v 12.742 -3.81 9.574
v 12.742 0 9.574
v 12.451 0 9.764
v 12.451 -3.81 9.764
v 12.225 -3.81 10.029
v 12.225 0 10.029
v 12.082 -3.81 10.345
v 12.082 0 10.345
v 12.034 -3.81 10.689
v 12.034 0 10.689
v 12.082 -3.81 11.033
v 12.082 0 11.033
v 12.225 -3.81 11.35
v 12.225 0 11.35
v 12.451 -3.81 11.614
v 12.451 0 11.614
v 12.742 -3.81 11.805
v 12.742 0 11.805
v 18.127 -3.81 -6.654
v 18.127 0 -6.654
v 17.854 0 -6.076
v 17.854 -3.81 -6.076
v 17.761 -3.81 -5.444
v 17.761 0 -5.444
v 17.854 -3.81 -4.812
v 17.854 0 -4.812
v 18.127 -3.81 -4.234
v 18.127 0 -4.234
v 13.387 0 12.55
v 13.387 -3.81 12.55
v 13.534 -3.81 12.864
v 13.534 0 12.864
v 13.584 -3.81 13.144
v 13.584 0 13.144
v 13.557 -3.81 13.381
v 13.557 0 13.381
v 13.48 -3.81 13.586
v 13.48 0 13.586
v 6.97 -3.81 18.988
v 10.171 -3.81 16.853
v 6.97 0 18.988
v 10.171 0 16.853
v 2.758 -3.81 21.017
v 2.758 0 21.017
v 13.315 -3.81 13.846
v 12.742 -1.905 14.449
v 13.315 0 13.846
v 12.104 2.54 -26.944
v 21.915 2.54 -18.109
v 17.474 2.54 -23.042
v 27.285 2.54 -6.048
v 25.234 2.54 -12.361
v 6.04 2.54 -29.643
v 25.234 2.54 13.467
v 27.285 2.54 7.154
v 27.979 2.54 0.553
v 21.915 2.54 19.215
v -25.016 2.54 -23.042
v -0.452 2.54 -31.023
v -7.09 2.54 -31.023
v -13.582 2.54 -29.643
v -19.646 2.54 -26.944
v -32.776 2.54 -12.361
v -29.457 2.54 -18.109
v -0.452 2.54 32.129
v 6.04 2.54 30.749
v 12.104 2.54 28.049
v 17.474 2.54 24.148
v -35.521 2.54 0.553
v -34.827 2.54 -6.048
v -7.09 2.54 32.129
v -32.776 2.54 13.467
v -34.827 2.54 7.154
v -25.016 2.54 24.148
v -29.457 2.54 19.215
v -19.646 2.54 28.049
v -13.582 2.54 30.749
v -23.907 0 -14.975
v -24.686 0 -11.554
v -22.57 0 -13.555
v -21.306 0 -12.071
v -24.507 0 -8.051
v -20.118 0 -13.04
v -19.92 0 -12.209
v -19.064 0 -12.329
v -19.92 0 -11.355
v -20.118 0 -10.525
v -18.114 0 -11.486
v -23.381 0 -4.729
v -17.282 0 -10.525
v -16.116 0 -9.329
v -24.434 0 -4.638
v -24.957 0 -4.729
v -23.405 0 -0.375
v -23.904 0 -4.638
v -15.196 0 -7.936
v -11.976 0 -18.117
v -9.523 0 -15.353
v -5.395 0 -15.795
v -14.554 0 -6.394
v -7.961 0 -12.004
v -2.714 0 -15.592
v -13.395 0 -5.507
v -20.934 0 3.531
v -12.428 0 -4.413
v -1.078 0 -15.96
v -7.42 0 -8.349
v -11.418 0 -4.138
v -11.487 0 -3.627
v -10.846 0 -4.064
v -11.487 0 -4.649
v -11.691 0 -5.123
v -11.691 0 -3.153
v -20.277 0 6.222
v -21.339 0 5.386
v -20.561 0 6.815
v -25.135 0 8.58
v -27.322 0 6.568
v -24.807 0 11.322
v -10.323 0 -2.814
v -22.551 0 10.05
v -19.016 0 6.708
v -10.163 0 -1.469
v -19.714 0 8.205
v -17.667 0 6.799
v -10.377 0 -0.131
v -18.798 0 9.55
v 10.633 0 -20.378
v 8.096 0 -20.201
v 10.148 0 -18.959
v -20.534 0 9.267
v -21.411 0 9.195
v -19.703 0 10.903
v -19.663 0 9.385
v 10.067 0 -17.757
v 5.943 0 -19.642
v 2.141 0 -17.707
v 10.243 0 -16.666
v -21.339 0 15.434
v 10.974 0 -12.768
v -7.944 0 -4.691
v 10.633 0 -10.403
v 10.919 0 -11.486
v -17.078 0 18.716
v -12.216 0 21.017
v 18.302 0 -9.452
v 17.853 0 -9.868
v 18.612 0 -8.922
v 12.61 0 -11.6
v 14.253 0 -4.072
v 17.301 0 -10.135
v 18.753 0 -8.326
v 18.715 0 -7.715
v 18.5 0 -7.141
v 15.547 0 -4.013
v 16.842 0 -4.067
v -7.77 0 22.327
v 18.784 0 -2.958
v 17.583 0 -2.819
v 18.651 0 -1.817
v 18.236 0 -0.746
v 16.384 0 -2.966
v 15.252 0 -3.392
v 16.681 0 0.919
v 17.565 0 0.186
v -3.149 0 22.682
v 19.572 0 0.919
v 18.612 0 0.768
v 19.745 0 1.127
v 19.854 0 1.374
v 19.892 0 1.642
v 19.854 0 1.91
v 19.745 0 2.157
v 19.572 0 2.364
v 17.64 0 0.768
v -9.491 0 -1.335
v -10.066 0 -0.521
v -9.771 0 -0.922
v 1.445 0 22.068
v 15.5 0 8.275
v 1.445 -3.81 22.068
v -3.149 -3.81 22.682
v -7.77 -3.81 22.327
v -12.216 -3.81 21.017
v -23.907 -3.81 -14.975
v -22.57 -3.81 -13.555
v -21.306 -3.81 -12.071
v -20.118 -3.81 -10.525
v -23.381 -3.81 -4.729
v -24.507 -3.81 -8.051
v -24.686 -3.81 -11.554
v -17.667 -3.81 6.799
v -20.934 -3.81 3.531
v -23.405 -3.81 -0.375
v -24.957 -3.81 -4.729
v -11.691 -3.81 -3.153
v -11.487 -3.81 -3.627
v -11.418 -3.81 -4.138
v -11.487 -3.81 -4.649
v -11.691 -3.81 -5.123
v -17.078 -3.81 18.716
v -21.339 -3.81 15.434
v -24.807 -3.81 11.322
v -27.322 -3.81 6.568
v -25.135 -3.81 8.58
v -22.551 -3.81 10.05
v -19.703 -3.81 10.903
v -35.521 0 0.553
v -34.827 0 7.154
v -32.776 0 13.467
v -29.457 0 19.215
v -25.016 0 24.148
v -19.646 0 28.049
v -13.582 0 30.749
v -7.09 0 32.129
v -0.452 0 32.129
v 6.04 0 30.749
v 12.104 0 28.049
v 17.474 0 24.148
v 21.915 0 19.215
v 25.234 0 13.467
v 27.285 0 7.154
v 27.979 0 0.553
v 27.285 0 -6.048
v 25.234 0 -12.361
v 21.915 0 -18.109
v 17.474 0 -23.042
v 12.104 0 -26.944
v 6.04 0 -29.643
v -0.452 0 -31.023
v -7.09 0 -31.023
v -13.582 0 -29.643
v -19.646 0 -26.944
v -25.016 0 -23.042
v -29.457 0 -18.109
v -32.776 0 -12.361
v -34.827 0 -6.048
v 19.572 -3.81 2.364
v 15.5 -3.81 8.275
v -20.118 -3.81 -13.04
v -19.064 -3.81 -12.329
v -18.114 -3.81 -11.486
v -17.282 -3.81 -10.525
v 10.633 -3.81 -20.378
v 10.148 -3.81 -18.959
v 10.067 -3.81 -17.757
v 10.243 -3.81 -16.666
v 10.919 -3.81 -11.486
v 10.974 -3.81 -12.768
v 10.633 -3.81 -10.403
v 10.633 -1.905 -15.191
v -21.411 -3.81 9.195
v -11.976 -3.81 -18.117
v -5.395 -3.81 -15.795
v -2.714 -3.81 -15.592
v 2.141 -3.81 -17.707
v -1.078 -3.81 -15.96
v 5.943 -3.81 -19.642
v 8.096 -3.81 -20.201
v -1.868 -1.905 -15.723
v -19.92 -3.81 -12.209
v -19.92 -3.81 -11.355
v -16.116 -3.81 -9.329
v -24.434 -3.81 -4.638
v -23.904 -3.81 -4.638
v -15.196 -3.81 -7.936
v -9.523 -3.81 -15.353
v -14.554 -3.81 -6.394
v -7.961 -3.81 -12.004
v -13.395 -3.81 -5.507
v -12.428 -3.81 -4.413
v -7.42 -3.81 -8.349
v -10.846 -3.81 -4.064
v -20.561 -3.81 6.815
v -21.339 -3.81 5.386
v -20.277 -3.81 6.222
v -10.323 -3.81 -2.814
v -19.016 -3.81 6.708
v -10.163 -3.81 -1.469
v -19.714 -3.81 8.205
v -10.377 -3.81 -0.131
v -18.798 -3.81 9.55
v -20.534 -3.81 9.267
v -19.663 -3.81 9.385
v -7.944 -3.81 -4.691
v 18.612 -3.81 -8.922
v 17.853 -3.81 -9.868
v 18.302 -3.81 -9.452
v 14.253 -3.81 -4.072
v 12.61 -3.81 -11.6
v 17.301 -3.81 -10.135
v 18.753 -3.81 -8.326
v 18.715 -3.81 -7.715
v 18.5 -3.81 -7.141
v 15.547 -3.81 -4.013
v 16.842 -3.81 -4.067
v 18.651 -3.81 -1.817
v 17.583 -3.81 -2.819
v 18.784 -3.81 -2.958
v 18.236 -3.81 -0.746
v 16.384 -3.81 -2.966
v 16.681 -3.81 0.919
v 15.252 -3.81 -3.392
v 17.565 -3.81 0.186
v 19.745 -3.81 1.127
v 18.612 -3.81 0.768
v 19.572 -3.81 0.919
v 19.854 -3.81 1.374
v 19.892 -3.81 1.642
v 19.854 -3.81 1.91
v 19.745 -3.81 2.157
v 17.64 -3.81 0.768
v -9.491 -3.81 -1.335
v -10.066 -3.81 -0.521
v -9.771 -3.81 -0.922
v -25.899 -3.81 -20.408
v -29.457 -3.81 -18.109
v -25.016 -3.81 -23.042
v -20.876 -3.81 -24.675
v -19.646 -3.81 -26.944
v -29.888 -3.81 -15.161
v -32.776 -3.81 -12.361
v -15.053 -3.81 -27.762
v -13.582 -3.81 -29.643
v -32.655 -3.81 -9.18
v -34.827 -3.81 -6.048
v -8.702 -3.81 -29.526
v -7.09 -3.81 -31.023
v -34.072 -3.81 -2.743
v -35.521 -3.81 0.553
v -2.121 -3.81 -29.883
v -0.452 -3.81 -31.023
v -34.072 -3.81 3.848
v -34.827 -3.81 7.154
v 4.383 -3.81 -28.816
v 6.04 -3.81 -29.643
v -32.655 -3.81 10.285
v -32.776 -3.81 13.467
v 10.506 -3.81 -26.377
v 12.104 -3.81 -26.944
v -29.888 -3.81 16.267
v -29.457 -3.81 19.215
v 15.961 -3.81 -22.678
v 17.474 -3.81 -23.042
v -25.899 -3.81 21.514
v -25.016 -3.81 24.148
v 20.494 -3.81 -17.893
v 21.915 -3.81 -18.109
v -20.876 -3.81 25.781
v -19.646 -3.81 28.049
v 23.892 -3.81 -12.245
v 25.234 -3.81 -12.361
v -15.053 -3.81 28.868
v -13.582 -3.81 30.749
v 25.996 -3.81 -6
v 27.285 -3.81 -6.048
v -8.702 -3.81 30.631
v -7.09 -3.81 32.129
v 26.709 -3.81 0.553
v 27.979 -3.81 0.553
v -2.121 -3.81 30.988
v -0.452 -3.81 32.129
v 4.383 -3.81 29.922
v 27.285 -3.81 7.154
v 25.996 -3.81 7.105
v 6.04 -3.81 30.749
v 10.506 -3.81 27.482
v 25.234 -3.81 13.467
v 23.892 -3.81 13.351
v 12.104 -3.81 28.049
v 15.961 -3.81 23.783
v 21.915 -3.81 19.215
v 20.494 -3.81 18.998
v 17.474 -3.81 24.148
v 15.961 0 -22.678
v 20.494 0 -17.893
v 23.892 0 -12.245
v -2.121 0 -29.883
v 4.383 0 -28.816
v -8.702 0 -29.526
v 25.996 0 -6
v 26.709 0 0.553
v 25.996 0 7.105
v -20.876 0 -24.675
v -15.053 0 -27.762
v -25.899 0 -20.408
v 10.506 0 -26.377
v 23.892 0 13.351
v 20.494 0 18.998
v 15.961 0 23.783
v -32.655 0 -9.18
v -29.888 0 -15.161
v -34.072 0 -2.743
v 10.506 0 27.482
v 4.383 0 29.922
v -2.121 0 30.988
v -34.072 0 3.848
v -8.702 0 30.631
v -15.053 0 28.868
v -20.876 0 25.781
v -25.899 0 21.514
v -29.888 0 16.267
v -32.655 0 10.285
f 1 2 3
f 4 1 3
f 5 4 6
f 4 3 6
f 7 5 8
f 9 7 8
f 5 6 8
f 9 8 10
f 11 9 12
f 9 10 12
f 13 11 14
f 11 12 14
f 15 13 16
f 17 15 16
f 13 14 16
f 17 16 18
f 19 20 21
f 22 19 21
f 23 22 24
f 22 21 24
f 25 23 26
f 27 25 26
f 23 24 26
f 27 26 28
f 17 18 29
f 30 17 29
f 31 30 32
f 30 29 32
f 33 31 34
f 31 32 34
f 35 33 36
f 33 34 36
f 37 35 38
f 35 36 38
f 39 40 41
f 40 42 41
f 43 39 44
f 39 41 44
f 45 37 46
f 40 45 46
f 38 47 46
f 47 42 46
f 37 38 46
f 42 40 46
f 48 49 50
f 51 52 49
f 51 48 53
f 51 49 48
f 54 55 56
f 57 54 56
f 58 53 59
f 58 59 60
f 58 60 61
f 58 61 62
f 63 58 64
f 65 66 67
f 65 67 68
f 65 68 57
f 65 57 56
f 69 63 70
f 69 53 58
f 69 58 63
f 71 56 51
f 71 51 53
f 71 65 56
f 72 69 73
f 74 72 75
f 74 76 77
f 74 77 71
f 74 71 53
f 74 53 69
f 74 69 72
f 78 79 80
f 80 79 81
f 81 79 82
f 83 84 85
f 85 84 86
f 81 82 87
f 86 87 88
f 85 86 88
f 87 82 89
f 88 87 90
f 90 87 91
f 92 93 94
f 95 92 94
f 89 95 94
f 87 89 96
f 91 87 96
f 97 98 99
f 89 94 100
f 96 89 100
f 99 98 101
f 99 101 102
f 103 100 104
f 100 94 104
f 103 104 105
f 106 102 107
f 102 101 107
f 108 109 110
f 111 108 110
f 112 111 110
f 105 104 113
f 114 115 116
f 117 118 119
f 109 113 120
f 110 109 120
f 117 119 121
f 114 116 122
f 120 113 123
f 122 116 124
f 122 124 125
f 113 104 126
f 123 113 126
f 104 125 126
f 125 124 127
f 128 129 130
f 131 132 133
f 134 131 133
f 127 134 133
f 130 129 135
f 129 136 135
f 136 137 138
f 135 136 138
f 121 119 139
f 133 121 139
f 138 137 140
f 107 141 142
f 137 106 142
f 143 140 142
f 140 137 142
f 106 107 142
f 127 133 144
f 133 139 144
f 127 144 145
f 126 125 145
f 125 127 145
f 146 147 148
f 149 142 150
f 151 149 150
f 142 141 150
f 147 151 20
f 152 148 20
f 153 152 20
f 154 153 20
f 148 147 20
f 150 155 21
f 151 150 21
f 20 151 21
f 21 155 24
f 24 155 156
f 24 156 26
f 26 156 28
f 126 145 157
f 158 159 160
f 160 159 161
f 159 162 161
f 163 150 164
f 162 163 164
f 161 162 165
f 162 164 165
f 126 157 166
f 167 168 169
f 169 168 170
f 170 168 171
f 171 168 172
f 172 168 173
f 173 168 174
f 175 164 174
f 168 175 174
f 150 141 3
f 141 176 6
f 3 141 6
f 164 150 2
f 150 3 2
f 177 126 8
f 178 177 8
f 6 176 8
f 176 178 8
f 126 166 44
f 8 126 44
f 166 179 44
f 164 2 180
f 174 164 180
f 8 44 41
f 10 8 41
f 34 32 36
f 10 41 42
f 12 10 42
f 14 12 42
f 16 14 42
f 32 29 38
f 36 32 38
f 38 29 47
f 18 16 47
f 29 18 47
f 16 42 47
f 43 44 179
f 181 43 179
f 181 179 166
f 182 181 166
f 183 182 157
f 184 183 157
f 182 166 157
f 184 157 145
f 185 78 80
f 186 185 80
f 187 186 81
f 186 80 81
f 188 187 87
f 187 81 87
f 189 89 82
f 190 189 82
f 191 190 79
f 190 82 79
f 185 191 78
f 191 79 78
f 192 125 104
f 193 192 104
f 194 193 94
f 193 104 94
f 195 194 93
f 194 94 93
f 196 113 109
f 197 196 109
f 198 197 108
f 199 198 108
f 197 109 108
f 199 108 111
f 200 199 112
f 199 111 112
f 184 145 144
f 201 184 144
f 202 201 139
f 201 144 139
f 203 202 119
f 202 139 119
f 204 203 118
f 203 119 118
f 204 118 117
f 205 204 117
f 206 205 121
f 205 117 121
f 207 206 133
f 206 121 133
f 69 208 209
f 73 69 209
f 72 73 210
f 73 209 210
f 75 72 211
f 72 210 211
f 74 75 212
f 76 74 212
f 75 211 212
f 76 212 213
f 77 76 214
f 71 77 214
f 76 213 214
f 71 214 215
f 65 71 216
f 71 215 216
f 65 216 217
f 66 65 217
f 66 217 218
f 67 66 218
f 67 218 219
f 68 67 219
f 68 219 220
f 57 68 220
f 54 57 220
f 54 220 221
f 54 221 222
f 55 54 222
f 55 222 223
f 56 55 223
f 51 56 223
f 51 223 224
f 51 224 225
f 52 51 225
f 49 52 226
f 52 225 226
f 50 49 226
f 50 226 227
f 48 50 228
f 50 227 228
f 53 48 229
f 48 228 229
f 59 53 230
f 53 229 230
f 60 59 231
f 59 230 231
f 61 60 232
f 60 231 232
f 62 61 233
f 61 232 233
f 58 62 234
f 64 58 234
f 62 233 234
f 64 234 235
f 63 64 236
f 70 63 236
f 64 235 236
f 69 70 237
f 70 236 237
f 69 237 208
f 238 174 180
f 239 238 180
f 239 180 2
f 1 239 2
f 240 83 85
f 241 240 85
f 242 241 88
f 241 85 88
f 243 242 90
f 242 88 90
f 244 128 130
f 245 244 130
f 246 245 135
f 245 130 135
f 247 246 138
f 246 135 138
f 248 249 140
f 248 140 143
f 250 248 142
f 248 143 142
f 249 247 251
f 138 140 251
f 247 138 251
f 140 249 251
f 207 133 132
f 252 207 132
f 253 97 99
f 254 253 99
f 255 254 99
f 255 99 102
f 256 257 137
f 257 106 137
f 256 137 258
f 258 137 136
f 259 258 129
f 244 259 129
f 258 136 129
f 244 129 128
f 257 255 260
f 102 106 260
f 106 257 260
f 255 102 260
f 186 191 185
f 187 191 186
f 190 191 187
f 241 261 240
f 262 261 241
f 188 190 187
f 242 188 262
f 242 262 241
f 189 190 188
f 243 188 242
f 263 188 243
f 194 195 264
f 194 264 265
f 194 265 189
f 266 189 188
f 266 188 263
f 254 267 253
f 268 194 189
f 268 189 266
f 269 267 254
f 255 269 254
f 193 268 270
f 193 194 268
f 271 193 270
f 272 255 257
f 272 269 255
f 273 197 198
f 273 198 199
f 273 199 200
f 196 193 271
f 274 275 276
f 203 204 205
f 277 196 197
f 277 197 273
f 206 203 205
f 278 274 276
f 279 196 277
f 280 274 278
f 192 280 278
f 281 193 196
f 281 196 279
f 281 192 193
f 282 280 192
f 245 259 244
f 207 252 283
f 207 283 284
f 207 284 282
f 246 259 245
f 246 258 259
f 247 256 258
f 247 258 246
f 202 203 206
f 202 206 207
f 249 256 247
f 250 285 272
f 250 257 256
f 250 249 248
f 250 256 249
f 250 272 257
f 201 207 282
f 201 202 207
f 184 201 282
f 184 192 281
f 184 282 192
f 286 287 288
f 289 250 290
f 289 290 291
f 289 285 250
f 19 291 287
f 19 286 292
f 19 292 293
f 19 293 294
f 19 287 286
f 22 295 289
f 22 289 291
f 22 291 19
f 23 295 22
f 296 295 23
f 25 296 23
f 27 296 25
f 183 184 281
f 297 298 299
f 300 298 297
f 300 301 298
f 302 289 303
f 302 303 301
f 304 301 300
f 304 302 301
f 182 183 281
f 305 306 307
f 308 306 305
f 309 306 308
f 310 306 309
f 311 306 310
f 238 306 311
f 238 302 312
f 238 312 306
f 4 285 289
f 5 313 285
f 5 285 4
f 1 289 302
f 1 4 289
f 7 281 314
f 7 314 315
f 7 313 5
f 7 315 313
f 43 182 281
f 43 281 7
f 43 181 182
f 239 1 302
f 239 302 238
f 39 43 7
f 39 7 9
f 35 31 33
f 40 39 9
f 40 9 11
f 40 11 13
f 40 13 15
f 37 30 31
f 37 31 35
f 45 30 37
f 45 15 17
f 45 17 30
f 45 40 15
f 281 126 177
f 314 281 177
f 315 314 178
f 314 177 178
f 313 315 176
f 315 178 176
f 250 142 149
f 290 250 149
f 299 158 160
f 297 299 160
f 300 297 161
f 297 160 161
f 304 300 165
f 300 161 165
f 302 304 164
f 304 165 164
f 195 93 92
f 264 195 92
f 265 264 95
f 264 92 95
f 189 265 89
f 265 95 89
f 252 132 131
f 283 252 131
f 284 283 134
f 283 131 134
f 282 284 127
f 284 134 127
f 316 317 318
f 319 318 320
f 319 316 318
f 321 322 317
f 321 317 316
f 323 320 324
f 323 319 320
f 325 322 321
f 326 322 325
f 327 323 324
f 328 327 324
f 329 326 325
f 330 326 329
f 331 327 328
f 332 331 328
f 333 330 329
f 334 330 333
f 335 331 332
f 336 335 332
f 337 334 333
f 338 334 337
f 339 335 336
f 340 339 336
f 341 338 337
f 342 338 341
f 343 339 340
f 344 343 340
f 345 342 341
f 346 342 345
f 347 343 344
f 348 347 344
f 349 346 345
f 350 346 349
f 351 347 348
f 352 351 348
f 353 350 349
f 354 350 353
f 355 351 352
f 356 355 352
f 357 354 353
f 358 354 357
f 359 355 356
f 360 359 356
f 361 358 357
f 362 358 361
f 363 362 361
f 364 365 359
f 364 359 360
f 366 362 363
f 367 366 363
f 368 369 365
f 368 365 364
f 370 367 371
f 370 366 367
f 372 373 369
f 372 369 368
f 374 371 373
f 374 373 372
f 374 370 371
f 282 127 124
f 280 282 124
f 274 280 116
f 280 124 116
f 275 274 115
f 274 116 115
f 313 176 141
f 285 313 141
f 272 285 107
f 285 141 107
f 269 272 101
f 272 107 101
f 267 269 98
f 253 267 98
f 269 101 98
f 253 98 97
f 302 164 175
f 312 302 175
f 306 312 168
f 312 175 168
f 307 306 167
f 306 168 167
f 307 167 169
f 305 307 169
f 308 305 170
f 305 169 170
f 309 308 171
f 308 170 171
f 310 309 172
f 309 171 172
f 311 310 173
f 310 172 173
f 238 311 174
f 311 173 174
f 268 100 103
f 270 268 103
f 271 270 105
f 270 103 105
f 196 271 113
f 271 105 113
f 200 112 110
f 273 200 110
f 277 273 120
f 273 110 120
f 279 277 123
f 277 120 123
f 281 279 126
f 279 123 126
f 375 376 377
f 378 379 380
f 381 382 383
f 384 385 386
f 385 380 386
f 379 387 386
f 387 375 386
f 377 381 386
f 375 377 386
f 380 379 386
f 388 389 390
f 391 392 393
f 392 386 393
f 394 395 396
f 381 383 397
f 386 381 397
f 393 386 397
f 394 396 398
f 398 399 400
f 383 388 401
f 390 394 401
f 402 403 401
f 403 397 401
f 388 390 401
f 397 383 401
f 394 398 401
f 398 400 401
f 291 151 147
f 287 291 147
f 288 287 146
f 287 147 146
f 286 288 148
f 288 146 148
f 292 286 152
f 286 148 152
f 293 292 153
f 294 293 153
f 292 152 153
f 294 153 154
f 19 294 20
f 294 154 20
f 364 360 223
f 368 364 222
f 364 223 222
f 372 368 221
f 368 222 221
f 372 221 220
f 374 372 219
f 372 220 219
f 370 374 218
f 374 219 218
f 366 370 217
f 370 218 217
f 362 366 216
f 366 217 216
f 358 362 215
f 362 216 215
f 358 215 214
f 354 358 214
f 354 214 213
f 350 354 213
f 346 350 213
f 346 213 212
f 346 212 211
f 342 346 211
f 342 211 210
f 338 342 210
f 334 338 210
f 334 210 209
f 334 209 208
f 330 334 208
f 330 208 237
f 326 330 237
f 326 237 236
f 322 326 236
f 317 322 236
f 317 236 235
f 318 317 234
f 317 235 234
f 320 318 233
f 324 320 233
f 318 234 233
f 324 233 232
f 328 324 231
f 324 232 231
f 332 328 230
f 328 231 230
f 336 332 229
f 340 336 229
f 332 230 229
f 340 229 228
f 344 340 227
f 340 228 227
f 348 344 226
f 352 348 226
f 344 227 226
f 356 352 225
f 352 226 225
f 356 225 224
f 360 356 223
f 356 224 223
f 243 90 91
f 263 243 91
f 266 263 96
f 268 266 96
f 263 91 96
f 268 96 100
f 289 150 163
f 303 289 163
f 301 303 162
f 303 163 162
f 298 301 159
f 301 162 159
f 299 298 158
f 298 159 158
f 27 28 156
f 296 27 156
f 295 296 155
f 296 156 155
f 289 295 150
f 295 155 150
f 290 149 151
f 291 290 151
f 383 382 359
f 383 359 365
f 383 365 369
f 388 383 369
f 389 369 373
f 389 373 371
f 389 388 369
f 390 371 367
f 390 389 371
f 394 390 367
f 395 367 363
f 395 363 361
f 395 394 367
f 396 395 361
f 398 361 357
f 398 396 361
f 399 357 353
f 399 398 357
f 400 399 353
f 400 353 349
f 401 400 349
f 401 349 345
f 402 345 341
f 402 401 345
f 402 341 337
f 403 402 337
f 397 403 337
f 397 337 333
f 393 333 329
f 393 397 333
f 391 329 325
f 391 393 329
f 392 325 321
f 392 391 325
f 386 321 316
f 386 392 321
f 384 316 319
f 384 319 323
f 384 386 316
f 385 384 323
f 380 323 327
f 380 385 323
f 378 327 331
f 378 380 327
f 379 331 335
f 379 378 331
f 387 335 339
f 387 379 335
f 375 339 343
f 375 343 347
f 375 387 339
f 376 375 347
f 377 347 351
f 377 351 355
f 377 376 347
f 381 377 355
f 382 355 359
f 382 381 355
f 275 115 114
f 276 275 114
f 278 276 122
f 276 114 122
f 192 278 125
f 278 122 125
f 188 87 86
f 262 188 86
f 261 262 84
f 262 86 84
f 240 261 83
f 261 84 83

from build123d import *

# Parameters (mm, degrees)
F1_DEPTH = 3.81
F2_R     = 31.75
F3_DEPTH = 2.54
F4_R     = 31.75
F4_R_2   = 30.48
F5_DEPTH = 3.81


with BuildPart() as f1:
    # F0 (on Front) → F1 (new body)
    with BuildSketch(Plane.XZ):
        with BuildLine():
            ThreePointArc((-9.490768629, -1.3346602329), (-7.5579138004, -10.1959187454), (-11.9757633656, -18.1168047711))
            add(Edge.make_bspline(
                [(-11.9757633656, -18.1168047711), (-8.6788288468, -16.8109305471), (-0.7085798365, -12.9941242591), (4.2491846252, -20.5106493086), (10.632770136, -20.3776583076)],
                knots=[0, 0, 0, 0, 0.4687671078, 1, 1, 1, 1], degree=3))
            add(Edge.make_bspline(
                [(10.632770136, -20.3776583076), (9.5688402653, -18.1168047711), (10.8670221827, -15.6541750534), (11.1647350714, -11.6002270952), (10.632770136, -10.4033045936)],
                knots=[0, 0, 0, 0, 0.5100040037, 1, 1, 1, 1], degree=3))
            Line((10.632770136, -10.4033045936), (12.6101998612, -11.6002270952))
            Line((12.6101998612, -11.6002270952), (17.3009453116, -10.1345536336))
            ThreePointArc((17.3009453116, -10.1345536336), (18.7044248726, -8.6295905373), (18.1271620095, -6.6543851337))
            ThreePointArc((18.1271620095, -6.6543851337), (17.7609364545, -5.4440140925), (18.1271620095, -4.2336430513))
            ThreePointArc((18.1271620095, -4.2336430513), (16.1953531955, -4.0262946088), (14.2529871893, -4.0720435791))
            ThreePointArc((14.2529871893, -4.0720435791), (16.3835840937, -2.966440153), (18.7839437276, -2.9577376776))
            ThreePointArc((18.7839437276, -2.9577376776), (18.2358957511, -0.745902377), (16.6805734693, 0.9194938466))
            ThreePointArc((16.6805734693, 0.9194938466), (18.1263272568, 0.7485939687), (19.5720810443, 0.9194938466))
            ThreePointArc((19.5720810443, 0.9194938466), (19.8916762952, 1.6419528984), (19.5720810443, 2.3644119501))
            Line((19.5720810443, 2.3644119501), (15.5000379309, 8.2754427567))
            Line((15.5000379309, 8.2754427567), (12.7415545285, 9.5735524578))
            ThreePointArc((12.7415545285, 9.5735524578), (12.0335327597, 10.6892403766), (12.7415545285, 11.8049282954))
            add(Edge.make_bspline(
                [(12.7415545285, 11.8049282954), (14.1864735633, 13.1356231868), (12.0090058877, 14.9494300325), (9.3262922019, 18.2585157454), (2.758481307, 21.0169982165)],
                knots=[0, 0, 0, 0, 0.319915039, 1, 1, 1, 1], degree=3))
            Line((2.758481307, 21.0169982165), (1.4449184528, 22.067848593))
            ThreePointArc((1.4449184528, 22.067848593), (-5.4689477613, 22.6258669897), (-12.2161302716, 21.0169982165))
            ThreePointArc((-12.2161302716, 21.0169982165), (-9.0028375656, 21.108873418), (-5.9110308066, 20.2288608998))
            ThreePointArc((-5.9110308066, 20.2288608998), (-5.2455840138, 15.8889747559), (-3.0211936682, 12.103539673))
            Line((-3.0211936682, 12.103539673), (-2.7584815398, 8.9322244748))
            ThreePointArc((-2.7584815398, 8.9322244748), (-4.6246008318, 9.3548412144), (-5.9110308066, 10.7712112367))
            ThreePointArc((-5.9110308066, 10.7712112367), (-5.2226948374, 8.8923289621), (-3.9406875148, 7.3559493758))
            ThreePointArc((-3.9406875148, 7.3559493758), (-5.2100932333, 6.3710945105), (-5.3856056184, 4.7740580718))
            ThreePointArc((-5.3856056184, 4.7740580718), (-7.4024444819, 5.8251218986), (-8.800867945, 7.6186619699))
            ThreePointArc((-8.800867945, 7.6186619699), (-8.2937158366, 4.7740580718), (-6.6991681233, 2.3644124158))
            Line((-6.6991681233, 2.3644124158), (-9.490768629, -1.3346602329))
        make_face()
        with BuildLine():
            ThreePointArc((-10.3771425784, -0.1313562243), (-9.9163961048, -0.7200736067), (-9.490768629, -1.3346602329))
            Line((-9.490768629, -1.3346602329), (-6.6991681233, 2.3644124158))
            ThreePointArc((-6.6991681233, 2.3644124158), (-8.2937158366, 4.7740580718), (-8.800867945, 7.6186619699))
            ThreePointArc((-8.800867945, 7.6186619699), (-7.4024444819, 5.8251218986), (-5.3856056184, 4.7740580718))
            ThreePointArc((-5.3856056184, 4.7740580718), (-5.2100932333, 6.3710945105), (-3.9406875148, 7.3559493758))
            ThreePointArc((-3.9406875148, 7.3559493758), (-5.2226948374, 8.8923289621), (-5.9110308066, 10.7712112367))
            ThreePointArc((-5.9110308066, 10.7712112367), (-4.6246008318, 9.3548412144), (-2.7584815398, 8.9322244748))
            Line((-2.7584815398, 8.9322244748), (-3.0211936682, 12.103539673))
            ThreePointArc((-3.0211936682, 12.103539673), (-5.2455840138, 15.8889747559), (-5.9110308066, 20.2288608998))
            ThreePointArc((-5.9110308066, 20.2288608998), (-7.598774869, 16.7427838954), (-10.5084991083, 14.1864744946))
            ThreePointArc((-10.5084991083, 14.1864744946), (-14.310113243, 11.2544111439), (-18.7984901373, 9.5503752357))
            ThreePointArc((-18.7984901373, 9.5503752357), (-20.1461563966, 7.5151055238), (-21.3393694118, 5.3856056184))
            ThreePointArc((-21.3393694118, 5.3856056184), (-19.6646079386, 6.5122872739), (-17.6666259792, 6.799176861))
            ThreePointArc((-17.6666259792, 6.799176861), (-22.2777243118, 1.6461002584), (-24.9566711947, -4.7288248315))
            ThreePointArc((-24.9566711947, -4.7288248315), (-24.1690406807, -4.6266738785), (-23.3814101666, -4.7288248315))
            ThreePointArc((-23.3814101666, -4.7288248315), (-24.7171946121, -9.7966888996), (-23.9068362862, -14.9746118113))
            ThreePointArc((-23.9068362862, -14.9746118113), (-21.9285237695, -12.8211326146), (-20.1180858814, -10.5247206922))
            ThreePointArc((-20.1180858814, -10.5247206922), (-19.8952019997, -11.7823043694), (-20.1180858814, -13.0398880467))
            ThreePointArc((-20.1180858814, -13.0398880467), (-18.5751404017, -11.9233883582), (-17.2824760725, -10.5247206922))
            ThreePointArc((-17.2824760725, -10.5247206922), (-15.6233412168, -8.6544844694), (-14.5544138715, -6.3944166985))
            ThreePointArc((-14.5544138715, -6.3944166985), (-12.8845675565, -4.9837137902), (-11.6907050833, -3.1525497325))
            ThreePointArc((-11.6907050833, -3.1525497325), (-11.4178286352, -4.1377216112), (-11.6907050833, -5.1228934899))
            ThreePointArc((-11.6907050833, -5.1228934899), (-10.3231984381, -2.8141578647), (-10.3771425784, -0.1313562243))
        make_face()
        with BuildLine():
            ThreePointArc((-10.5084991083, 14.1864744946), (-7.598774869, 16.7427838954), (-5.9110308066, 20.2288608998))
            ThreePointArc((-5.9110308066, 20.2288608998), (-9.0028375656, 21.108873418), (-12.2161302716, 21.0169982165))
            ThreePointArc((-12.2161302716, 21.0169982165), (-21.3393694118, 15.4340351557), (-27.3220986128, 6.5678115934))
            ThreePointArc((-27.3220986128, 6.5678115934), (-23.8845666313, 9.3886545614), (-19.7034366429, 10.9025677666))
            Line((-19.7034366429, 10.9025677666), (-21.4110668749, 9.1949366033))
            ThreePointArc((-21.4110668749, 9.1949366033), (-20.0976158669, 9.3200084503), (-18.7984901373, 9.5503752357))
            ThreePointArc((-18.7984901373, 9.5503752357), (-14.310113243, 11.2544111439), (-10.5084991083, 14.1864744946))
        make_face()
    extrude(amount=F1_DEPTH)


with BuildPart() as f3:
    # F2 (on face) → F3 (new body)
    with BuildSketch(Plane(origin=(0, 0, 0), x_dir=(-1, 0, 0), z_dir=(0, 1, 0))):
        with Locations((3.7710163716, 0.5527688936)):
            Circle(F2_R)
        with BuildLine():
            Line((-15.5000379309, 8.2754427567), (-12.7415545285, 9.5735524578))
            ThreePointArc((-12.7415545285, 9.5735524578), (-12.0335327597, 10.6892403766), (-12.7415545285, 11.8049282954))
            add(Edge.make_bspline(
                [(-12.7415545285, 11.8049282954), (-14.1864735633, 13.1356231868), (-12.0090058877, 14.9494300325), (-9.3262922019, 18.2585157454), (-2.758481307, 21.0169982165)],
                knots=[0, 0, 0, 0, 0.319915039, 1, 1, 1, 1], degree=3))
            Line((-2.758481307, 21.0169982165), (-1.4449184528, 22.067848593))
            ThreePointArc((-1.4449184528, 22.067848593), (5.4689477613, 22.6258669897), (12.2161302716, 21.0169982165))
            ThreePointArc((12.2161302716, 21.0169982165), (21.3393694118, 15.4340351557), (27.3220986128, 6.5678115934))
            ThreePointArc((27.3220986128, 6.5678115934), (23.8845666313, 9.3886545614), (19.7034366429, 10.9025677666))
            Line((19.7034366429, 10.9025677666), (21.4110668749, 9.1949366033))
            ThreePointArc((21.4110668749, 9.1949366033), (20.0976158669, 9.3200084503), (18.7984901373, 9.5503752357))
            ThreePointArc((18.7984901373, 9.5503752357), (20.1461563966, 7.5151055238), (21.3393694118, 5.3856056184))
            ThreePointArc((21.3393694118, 5.3856056184), (19.6646079386, 6.5122872739), (17.6666259792, 6.799176861))
            ThreePointArc((17.6666259792, 6.799176861), (22.2777243118, 1.6461002584), (24.9566711947, -4.7288248315))
            ThreePointArc((24.9566711947, -4.7288248315), (24.1690406807, -4.6266738785), (23.3814101666, -4.7288248315))
            ThreePointArc((23.3814101666, -4.7288248315), (24.7171946121, -9.7966888996), (23.9068362862, -14.9746118113))
            ThreePointArc((23.9068362862, -14.9746118113), (21.9285237695, -12.8211326146), (20.1180858814, -10.5247206922))
            ThreePointArc((20.1180858814, -10.5247206922), (19.8952019997, -11.7823043694), (20.1180858814, -13.0398880467))
            ThreePointArc((20.1180858814, -13.0398880467), (18.5751404017, -11.9233883582), (17.2824760725, -10.5247206922))
            ThreePointArc((17.2824760725, -10.5247206922), (15.6233412168, -8.6544844694), (14.5544138715, -6.3944166985))
            ThreePointArc((14.5544138715, -6.3944166985), (12.8845675565, -4.9837137902), (11.6907050833, -3.1525497325))
            ThreePointArc((11.6907050833, -3.1525497325), (11.4178286352, -4.1377216112), (11.6907050833, -5.1228934899))
            ThreePointArc((11.6907050833, -5.1228934899), (10.3231984381, -2.8141578647), (10.3771425784, -0.1313562243))
            ThreePointArc((10.3771425784, -0.1313562243), (7.4700314009, -9.4535225216), (11.9757633656, -18.1168047711))
            add(Edge.make_bspline(
                [(11.9757633656, -18.1168047711), (8.6788288468, -16.8109305471), (0.7085798365, -12.9941242591), (-4.2491846252, -20.5106493086), (-10.632770136, -20.3776583076)],
                knots=[0, 0, 0, 0, 0.4687671078, 1, 1, 1, 1], degree=3))
            add(Edge.make_bspline(
                [(-10.632770136, -20.3776583076), (-9.5688402653, -18.1168047711), (-10.8670221827, -15.6541750534), (-11.1647350714, -11.6002270952), (-10.632770136, -10.4033045936)],
                knots=[0, 0, 0, 0, 0.5100040037, 1, 1, 1, 1], degree=3))
            Line((-10.632770136, -10.4033045936), (-12.6101998612, -11.6002270952))
            Line((-12.6101998612, -11.6002270952), (-17.3009453116, -10.1345536336))
            ThreePointArc((-17.3009453116, -10.1345536336), (-18.7044248726, -8.6295905373), (-18.1271620095, -6.6543851337))
            ThreePointArc((-18.1271620095, -6.6543851337), (-17.7609364545, -5.4440140925), (-18.1271620095, -4.2336430513))
            ThreePointArc((-18.1271620095, -4.2336430513), (-16.1953531955, -4.0262946088), (-14.2529871893, -4.0720435791))
            ThreePointArc((-14.2529871893, -4.0720435791), (-16.3835840937, -2.966440153), (-18.7839437276, -2.9577376776))
            ThreePointArc((-18.7839437276, -2.9577376776), (-18.2358957511, -0.745902377), (-16.6805734693, 0.9194938466))
            ThreePointArc((-16.6805734693, 0.9194938466), (-18.1263272568, 0.7485939687), (-19.5720810443, 0.9194938466))
            ThreePointArc((-19.5720810443, 0.9194938466), (-19.8916762952, 1.6419528984), (-19.5720810443, 2.3644119501))
            Line((-19.5720810443, 2.3644119501), (-15.5000379309, 8.2754427567))
        make_face(mode=Mode.SUBTRACT)
        with BuildLine():
            ThreePointArc((-12.7415545285, 11.8049282954), (-12.0335327597, 10.6892403766), (-12.7415545285, 9.5735524578))
            Line((-12.7415545285, 9.5735524578), (-15.5000379309, 8.2754427567))
            Line((-15.5000379309, 8.2754427567), (-19.5720810443, 2.3644119501))
            ThreePointArc((-19.5720810443, 2.3644119501), (-19.8916762952, 1.6419528984), (-19.5720810443, 0.9194938466))
            ThreePointArc((-19.5720810443, 0.9194938466), (-18.1263272568, 0.7485939687), (-16.6805734693, 0.9194938466))
            ThreePointArc((-16.6805734693, 0.9194938466), (-18.2358957511, -0.745902377), (-18.7839437276, -2.9577376776))
            ThreePointArc((-18.7839437276, -2.9577376776), (-16.3835840937, -2.966440153), (-14.2529871893, -4.0720435791))
            ThreePointArc((-14.2529871893, -4.0720435791), (-16.1953531955, -4.0262946088), (-18.1271620095, -4.2336430513))
            ThreePointArc((-18.1271620095, -4.2336430513), (-17.7609364545, -5.4440140925), (-18.1271620095, -6.6543851337))
            ThreePointArc((-18.1271620095, -6.6543851337), (-18.7044248726, -8.6295905373), (-17.3009453116, -10.1345536336))
            Line((-17.3009453116, -10.1345536336), (-12.6101998612, -11.6002270952))
            Line((-12.6101998612, -11.6002270952), (-10.632770136, -10.4033045936))
            add(Edge.make_bspline(
                [(-10.632770136, -20.3776583076), (-9.5688402653, -18.1168047711), (-10.8670221827, -15.6541750534), (-11.1647350714, -11.6002270952), (-10.632770136, -10.4033045936)],
                knots=[0, 0, 0, 0, 0.5100040037, 1, 1, 1, 1], degree=3))
            add(Edge.make_bspline(
                [(11.9757633656, -18.1168047711), (8.6788288468, -16.8109305471), (0.7085798365, -12.9941242591), (-4.2491846252, -20.5106493086), (-10.632770136, -20.3776583076)],
                knots=[0, 0, 0, 0, 0.4687671078, 1, 1, 1, 1], degree=3))
            ThreePointArc((11.9757633656, -18.1168047711), (7.4700314009, -9.4535225216), (10.3771425784, -0.1313562243))
            ThreePointArc((10.3771425784, -0.1313562243), (10.3231984381, -2.8141578647), (11.6907050833, -5.1228934899))
            ThreePointArc((11.6907050833, -5.1228934899), (11.4178286352, -4.1377216112), (11.6907050833, -3.1525497325))
            ThreePointArc((11.6907050833, -3.1525497325), (12.8845675565, -4.9837137902), (14.5544138715, -6.3944166985))
            ThreePointArc((14.5544138715, -6.3944166985), (15.6233412168, -8.6544844694), (17.2824760725, -10.5247206922))
            ThreePointArc((17.2824760725, -10.5247206922), (18.5751404017, -11.9233883582), (20.1180858814, -13.0398880467))
            ThreePointArc((20.1180858814, -13.0398880467), (19.8952019997, -11.7823043694), (20.1180858814, -10.5247206922))
            ThreePointArc((20.1180858814, -10.5247206922), (21.9285237695, -12.8211326146), (23.9068362862, -14.9746118113))
            ThreePointArc((23.9068362862, -14.9746118113), (24.7171946121, -9.7966888996), (23.3814101666, -4.7288248315))
            ThreePointArc((23.3814101666, -4.7288248315), (24.1690406807, -4.6266738785), (24.9566711947, -4.7288248315))
            ThreePointArc((24.9566711947, -4.7288248315), (22.2777243118, 1.6461002584), (17.6666259792, 6.799176861))
            ThreePointArc((17.6666259792, 6.799176861), (19.6646079386, 6.5122872739), (21.3393694118, 5.3856056184))
            ThreePointArc((21.3393694118, 5.3856056184), (20.1461563966, 7.5151055238), (18.7984901373, 9.5503752357))
            ThreePointArc((18.7984901373, 9.5503752357), (20.0976158669, 9.3200084503), (21.4110668749, 9.1949366033))
            Line((21.4110668749, 9.1949366033), (19.7034366429, 10.9025677666))
            ThreePointArc((19.7034366429, 10.9025677666), (23.8845666313, 9.3886545614), (27.3220986128, 6.5678115934))
            ThreePointArc((27.3220986128, 6.5678115934), (21.3393694118, 15.4340351557), (12.2161302716, 21.0169982165))
            ThreePointArc((12.2161302716, 21.0169982165), (5.4689477613, 22.6258669897), (-1.4449184528, 22.067848593))
            Line((-1.4449184528, 22.067848593), (-2.758481307, 21.0169982165))
            add(Edge.make_bspline(
                [(-12.7415545285, 11.8049282954), (-14.1864735633, 13.1356231868), (-12.0090058877, 14.9494300325), (-9.3262922019, 18.2585157454), (-2.758481307, 21.0169982165)],
                knots=[0, 0, 0, 0, 0.319915039, 1, 1, 1, 1], degree=3))
        make_face()
    extrude(amount=F3_DEPTH)

    # F4 (on face) → F5 (join)
    with BuildSketch(Plane.XZ):
        with Locations((-3.7710163716, 0.5527688936)):
            Circle(F4_R)
        with Locations((-3.7710163716, 0.5527688936)):
            Circle(F4_R_2, mode=Mode.SUBTRACT)
    extrude(amount=F5_DEPTH)


solid = Compound([f1.part, f3.part])
